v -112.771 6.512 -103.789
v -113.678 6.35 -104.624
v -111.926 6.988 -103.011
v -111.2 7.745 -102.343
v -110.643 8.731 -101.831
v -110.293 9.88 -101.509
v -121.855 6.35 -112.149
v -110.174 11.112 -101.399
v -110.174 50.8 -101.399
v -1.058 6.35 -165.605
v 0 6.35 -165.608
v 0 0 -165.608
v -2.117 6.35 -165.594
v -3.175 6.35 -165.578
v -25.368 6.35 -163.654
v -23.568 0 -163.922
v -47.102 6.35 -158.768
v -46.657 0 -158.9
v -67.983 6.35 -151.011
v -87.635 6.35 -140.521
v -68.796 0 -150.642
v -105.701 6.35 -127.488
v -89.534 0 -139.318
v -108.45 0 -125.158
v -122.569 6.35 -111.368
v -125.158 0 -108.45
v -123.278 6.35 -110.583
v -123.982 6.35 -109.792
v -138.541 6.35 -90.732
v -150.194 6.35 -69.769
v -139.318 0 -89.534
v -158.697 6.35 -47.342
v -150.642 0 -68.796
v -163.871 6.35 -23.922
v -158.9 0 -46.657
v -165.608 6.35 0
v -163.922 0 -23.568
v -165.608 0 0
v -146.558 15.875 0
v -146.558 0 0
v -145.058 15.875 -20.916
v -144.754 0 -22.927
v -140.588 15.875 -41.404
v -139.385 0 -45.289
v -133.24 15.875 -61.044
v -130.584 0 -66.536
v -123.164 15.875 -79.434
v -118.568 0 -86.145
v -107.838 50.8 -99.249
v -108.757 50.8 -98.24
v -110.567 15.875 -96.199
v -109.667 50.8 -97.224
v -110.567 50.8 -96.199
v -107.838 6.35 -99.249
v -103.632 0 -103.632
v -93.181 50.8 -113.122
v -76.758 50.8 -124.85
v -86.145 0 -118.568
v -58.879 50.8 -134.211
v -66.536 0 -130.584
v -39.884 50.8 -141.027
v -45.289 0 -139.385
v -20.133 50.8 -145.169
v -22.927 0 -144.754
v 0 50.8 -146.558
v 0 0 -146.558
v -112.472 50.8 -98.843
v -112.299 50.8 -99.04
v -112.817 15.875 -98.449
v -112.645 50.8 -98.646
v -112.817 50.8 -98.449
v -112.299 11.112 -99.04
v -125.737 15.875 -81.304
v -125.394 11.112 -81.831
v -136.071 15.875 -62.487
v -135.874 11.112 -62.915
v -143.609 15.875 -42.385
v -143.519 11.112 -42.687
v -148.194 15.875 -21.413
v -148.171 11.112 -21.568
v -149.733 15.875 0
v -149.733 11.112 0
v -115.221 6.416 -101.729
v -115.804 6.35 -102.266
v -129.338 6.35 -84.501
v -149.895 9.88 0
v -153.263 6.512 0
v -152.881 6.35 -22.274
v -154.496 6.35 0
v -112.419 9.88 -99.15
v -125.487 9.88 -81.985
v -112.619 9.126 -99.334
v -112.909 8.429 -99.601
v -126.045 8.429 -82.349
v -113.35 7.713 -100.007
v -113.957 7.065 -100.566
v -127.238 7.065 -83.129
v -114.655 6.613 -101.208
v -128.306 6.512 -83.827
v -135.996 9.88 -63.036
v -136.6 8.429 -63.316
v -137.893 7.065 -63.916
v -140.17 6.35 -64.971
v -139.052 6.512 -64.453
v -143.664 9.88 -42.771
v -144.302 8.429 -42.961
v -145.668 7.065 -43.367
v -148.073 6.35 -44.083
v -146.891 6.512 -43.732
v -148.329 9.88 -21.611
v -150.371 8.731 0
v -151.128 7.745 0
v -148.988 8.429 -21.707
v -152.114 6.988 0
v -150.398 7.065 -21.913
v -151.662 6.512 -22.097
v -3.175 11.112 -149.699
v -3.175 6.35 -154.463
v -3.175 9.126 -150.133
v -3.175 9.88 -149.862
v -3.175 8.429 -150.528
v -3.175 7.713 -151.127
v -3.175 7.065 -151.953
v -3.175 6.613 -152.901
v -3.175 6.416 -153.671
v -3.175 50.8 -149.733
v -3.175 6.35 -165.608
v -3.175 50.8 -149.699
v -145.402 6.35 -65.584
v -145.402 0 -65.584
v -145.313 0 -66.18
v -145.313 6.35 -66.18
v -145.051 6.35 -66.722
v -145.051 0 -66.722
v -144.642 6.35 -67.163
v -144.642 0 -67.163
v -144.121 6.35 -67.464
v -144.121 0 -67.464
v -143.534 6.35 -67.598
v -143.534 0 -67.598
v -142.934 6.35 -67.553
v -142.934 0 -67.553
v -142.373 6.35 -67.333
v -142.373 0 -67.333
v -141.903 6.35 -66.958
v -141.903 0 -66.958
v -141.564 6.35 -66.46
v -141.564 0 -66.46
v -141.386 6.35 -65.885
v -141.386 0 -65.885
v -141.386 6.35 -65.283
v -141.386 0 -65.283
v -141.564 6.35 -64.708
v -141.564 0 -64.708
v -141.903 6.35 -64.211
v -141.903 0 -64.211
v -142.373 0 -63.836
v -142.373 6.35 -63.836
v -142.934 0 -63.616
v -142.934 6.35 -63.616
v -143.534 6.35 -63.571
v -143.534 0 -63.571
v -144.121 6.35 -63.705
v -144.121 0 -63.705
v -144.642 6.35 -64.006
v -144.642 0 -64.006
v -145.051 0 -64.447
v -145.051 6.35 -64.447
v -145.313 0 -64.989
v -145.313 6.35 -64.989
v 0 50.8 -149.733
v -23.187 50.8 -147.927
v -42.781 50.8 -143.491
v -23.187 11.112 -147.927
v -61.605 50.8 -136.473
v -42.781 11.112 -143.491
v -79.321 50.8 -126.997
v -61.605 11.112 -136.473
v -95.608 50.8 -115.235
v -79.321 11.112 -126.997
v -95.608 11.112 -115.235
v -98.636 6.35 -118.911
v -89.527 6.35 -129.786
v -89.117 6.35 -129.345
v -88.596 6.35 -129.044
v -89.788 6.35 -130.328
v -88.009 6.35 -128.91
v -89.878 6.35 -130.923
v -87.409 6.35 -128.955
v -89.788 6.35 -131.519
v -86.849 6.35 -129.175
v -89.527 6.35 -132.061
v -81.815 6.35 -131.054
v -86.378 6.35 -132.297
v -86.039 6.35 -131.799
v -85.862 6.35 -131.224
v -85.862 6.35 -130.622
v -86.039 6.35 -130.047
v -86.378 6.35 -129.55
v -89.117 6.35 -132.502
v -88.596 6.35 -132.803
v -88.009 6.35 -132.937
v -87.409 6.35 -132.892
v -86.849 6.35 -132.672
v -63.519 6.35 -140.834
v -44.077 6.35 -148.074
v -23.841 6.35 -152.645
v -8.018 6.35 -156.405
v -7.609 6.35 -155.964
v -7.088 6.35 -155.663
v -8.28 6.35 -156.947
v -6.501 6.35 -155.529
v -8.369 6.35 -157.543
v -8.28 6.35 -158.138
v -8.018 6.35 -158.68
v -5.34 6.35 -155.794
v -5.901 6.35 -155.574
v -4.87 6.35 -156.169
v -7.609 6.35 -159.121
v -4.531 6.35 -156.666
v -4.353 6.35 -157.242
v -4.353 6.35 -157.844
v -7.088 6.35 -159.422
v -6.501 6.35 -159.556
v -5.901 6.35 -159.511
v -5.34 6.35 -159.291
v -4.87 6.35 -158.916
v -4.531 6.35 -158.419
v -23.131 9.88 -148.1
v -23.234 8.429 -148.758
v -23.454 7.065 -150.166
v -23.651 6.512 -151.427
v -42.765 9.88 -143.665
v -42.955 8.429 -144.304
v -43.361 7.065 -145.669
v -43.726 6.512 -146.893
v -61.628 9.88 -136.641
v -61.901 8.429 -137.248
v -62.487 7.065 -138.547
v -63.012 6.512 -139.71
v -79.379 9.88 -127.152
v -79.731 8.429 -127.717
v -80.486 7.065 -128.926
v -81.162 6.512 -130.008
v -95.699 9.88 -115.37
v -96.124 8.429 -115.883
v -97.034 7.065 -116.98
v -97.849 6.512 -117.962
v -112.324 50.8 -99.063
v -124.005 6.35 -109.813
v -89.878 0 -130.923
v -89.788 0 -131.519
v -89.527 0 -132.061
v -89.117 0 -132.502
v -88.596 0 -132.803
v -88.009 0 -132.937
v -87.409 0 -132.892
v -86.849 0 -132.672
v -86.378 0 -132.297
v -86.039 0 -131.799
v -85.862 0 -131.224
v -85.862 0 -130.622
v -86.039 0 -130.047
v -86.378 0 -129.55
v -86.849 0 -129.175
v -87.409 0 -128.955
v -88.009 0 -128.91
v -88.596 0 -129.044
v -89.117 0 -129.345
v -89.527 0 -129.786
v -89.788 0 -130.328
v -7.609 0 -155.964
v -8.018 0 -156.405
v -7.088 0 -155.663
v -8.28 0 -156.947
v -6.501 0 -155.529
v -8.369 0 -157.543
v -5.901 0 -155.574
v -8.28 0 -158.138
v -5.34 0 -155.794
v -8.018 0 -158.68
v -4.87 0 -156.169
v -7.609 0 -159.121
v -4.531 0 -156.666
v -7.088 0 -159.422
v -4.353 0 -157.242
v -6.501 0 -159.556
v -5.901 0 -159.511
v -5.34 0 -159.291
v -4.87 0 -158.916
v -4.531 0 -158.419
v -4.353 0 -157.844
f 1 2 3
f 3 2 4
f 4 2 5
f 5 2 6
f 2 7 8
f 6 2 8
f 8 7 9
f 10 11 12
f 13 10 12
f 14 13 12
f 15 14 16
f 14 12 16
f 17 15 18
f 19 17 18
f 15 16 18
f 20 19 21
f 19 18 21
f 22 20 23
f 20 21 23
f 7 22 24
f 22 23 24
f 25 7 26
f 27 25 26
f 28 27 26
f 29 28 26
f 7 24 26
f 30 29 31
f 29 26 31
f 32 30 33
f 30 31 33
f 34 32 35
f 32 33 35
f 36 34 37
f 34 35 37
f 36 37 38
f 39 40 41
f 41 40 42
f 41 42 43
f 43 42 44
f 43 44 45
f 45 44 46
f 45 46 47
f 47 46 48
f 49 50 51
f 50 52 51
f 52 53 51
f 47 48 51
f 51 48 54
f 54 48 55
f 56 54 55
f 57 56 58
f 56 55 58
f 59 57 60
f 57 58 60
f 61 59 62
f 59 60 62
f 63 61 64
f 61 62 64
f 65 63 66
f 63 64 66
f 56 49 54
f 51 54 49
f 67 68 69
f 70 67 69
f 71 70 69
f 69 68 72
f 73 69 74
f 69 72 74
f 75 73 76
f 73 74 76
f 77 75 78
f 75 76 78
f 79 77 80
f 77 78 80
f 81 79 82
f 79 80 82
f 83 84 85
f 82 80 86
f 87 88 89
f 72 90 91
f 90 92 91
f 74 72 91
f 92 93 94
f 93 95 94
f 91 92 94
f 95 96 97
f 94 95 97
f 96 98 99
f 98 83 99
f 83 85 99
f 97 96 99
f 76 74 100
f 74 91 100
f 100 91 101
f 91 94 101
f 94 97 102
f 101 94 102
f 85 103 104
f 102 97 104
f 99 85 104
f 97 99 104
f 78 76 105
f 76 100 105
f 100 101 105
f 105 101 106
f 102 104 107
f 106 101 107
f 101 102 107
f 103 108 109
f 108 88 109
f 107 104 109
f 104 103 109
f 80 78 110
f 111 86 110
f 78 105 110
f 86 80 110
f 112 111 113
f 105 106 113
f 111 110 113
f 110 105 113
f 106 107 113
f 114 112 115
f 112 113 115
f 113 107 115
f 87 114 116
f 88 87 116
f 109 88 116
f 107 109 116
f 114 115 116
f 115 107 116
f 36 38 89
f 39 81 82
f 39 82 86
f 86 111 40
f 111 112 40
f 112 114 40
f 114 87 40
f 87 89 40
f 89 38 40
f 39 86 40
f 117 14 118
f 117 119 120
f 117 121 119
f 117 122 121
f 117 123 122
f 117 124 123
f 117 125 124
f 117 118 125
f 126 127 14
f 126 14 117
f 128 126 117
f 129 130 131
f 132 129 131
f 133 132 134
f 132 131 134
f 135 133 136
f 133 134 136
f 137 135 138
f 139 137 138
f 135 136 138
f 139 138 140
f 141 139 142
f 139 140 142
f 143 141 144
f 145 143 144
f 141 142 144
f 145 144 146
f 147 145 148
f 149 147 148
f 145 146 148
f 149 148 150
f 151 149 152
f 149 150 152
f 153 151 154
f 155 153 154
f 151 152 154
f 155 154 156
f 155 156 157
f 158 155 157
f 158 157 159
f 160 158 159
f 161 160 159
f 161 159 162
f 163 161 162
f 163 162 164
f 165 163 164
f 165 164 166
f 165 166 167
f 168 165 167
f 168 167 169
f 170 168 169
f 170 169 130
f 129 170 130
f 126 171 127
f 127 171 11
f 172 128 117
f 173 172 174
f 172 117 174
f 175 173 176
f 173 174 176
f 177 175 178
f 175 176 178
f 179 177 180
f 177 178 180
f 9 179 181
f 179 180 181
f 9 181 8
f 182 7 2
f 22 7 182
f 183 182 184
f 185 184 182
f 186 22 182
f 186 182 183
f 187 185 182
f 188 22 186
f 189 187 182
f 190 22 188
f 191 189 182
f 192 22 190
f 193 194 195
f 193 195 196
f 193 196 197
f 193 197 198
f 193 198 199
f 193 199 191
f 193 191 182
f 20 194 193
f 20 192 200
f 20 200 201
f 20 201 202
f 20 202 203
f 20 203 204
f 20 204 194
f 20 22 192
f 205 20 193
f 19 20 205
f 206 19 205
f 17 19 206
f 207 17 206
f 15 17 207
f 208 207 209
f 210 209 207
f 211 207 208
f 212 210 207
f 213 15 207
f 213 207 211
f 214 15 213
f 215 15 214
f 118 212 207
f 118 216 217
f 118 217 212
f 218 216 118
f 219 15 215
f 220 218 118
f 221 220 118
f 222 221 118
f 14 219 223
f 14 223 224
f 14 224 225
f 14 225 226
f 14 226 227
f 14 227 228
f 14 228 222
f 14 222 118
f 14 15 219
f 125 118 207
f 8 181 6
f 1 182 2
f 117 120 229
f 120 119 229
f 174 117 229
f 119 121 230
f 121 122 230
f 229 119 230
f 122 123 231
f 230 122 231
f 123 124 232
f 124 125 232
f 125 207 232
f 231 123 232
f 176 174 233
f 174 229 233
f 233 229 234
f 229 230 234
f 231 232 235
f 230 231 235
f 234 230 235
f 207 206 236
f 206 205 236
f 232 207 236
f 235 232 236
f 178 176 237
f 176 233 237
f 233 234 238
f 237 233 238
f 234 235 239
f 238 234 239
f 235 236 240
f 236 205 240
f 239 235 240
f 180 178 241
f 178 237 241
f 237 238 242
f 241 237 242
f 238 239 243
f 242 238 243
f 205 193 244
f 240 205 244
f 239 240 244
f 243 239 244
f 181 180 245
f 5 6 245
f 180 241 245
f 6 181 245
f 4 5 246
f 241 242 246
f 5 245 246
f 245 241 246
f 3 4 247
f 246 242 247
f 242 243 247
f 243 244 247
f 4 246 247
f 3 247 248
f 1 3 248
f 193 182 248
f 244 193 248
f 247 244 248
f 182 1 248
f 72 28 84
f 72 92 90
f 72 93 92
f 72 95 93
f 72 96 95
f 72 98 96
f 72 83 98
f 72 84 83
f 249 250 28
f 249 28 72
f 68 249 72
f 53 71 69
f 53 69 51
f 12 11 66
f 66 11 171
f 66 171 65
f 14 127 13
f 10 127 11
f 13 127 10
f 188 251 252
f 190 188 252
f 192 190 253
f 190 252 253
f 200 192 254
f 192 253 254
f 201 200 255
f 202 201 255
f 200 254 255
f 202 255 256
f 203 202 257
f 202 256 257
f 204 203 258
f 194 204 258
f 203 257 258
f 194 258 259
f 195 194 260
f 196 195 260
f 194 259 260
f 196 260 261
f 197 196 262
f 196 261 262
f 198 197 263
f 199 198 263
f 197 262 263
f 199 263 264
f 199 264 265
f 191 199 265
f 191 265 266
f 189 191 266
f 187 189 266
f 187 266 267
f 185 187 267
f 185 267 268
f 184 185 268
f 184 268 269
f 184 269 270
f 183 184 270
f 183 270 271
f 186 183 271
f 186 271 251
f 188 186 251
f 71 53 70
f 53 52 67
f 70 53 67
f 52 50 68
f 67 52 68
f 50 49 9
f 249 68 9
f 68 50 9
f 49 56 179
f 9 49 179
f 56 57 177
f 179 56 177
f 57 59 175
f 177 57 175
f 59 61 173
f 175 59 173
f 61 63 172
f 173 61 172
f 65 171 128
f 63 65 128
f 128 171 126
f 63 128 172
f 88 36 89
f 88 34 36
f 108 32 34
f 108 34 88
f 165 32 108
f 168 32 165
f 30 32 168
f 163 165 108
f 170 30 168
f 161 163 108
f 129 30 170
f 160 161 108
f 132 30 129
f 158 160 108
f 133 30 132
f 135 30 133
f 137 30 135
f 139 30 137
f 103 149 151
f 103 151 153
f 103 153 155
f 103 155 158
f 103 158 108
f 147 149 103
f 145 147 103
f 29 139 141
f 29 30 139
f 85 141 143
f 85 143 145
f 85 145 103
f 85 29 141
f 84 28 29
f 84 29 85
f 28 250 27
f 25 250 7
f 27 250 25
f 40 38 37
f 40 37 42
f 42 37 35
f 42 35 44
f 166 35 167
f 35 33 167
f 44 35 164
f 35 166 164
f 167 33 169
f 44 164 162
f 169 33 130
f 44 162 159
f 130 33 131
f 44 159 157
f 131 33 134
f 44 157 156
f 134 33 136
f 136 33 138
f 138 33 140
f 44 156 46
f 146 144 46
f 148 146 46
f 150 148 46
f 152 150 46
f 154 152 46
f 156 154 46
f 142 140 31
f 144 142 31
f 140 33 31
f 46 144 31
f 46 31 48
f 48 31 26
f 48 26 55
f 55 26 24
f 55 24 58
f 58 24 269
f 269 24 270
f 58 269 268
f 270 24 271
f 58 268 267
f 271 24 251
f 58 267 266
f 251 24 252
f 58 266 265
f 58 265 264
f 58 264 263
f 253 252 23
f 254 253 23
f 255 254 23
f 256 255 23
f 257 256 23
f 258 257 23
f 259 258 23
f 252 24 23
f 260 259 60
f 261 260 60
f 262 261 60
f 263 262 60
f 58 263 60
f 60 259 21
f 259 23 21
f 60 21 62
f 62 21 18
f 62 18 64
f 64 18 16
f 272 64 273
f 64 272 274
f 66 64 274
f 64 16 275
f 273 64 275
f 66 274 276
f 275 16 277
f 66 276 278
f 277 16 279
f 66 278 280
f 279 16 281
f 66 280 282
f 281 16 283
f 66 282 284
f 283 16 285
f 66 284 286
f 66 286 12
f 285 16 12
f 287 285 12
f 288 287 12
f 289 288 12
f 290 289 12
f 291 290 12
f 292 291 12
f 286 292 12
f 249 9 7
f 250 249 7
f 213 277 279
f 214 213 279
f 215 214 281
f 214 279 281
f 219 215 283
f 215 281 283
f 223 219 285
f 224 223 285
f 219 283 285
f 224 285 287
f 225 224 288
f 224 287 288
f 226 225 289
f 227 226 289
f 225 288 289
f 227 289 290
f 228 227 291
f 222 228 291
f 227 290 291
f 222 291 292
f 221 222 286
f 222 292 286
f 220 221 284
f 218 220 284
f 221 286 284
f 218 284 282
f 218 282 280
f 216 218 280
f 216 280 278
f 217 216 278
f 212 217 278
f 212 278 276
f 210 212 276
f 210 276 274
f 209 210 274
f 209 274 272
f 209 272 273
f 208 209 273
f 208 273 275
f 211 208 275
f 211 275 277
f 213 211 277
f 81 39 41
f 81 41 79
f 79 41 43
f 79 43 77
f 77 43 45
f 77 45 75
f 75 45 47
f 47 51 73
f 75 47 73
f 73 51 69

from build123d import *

# Parameters (mm, degrees)
BOSS_EXTRUDE1_DEPTH        = 6.35
BOSS_EXTRUDE2_DEPTH        = 44.45
CUT_EXTRUDE2_DEPTH         = 1
CUT_EXTRUDE2_DEPTH_BACK    = 34.925
F_10_32_TAPPED_HOLE1_D     = 4.0386
F_10_32_TAPPED_HOLE1_DEPTH = 6.35
BOSS_EXTRUDE5_DEPTH        = 3.175
CIRPATTERN1_COUNT          = 2
CIRPATTERN1_ANGLE          = 47.375
FILLET1_R                  = 4.7625


with BuildPart() as part:
    # Sketch1 → Boss-Extrude1 (new body)
    with BuildSketch(Plane(origin=(0, 0, 0), x_dir=(1, 0, 0), z_dir=(0, 1, 0))):
        with BuildLine():
            Line((0, 146.558), (0, 165.608))
            ThreePointArc((0, 165.608), (-117.102539819, 117.102539819), (-165.608, 0))
            Line((-165.608, 0), (-146.558, 0))
            ThreePointArc((-146.558, 0), (-103.632155637, 103.632155637), (0, 146.558))
        make_face()
    extrude(amount=BOSS_EXTRUDE1_DEPTH)

    # Sketch4 → Boss-Extrude2 (add)
    with BuildSketch(Plane(origin=(0, 6.35, 0), x_dir=(1, 0, 0), z_dir=(0, 1, 0))):
        with BuildLine():
            Line((-149.733, 0), (-146.558, 0))
            ThreePointArc((-146.558, 0), (-103.632155637, 103.632155637), (0, 146.558))
            Line((0, 146.558), (0, 149.733))
            ThreePointArc((0, 149.733), (-105.877219667, 105.877219667), (-149.733, 0))
        make_face()
    extrude(amount=BOSS_EXTRUDE2_DEPTH)

    # Sketch5 → Cut-Extrude2 (cut, two sides)
    with BuildSketch(Plane(origin=(0, 50.8, 0), x_dir=(1, 0, 0), z_dir=(0, 1, 0))) as cut_extrude2_sk:
        with BuildLine():
            Line((-146.558, 0), (-149.733, 0))
            ThreePointArc((-149.733, 0), (-140.20067708, 52.57129859), (-112.817404434, 98.448994641))
            Line((-112.817404434, 98.448994641), (-110.567041393, 96.198631599))
            ThreePointArc((-110.567041393, 96.198631599), (-137.265676366, 51.355442319), (-146.558, 0))
        make_face()
    extrude(amount=CUT_EXTRUDE2_DEPTH, mode=Mode.SUBTRACT)
    extrude(cut_extrude2_sk.sketch, amount=-CUT_EXTRUDE2_DEPTH_BACK, mode=Mode.SUBTRACT)

    # #10-32 Tapped Hole1
    with Locations(Plane(origin=(0, 6.35, 0), x_dir=(1, 0, 0), z_dir=(0, 1, 0))):
        with Locations((-6.35, 157.542578595), (-87.858258413, 130.923309609), (-143.383000088, 65.58431105)):
            Hole(F_10_32_TAPPED_HOLE1_D / 2, depth=F_10_32_TAPPED_HOLE1_DEPTH)

    # Sketch9 → Boss-Extrude5 (add)
    with BuildSketch(Plane(origin=(0, 0, 0), x_dir=(0, 0, -1), z_dir=(1, 0, 0))):
        Polygon((149.733, 50.8), (165.608, 6.35), (146.558, 6.35), (146.558, 50.8), align=None)
    boss_extrude5 = extrude(amount=-BOSS_EXTRUDE5_DEPTH)

    # CirPattern1: Boss-Extrude5 ×2 about axis
    cirpattern1_axis = Axis((0, 0, 0), (0, 1, 0))
    for i in range(1, CIRPATTERN1_COUNT):
        add(boss_extrude5.rotate(cirpattern1_axis, i * CIRPATTERN1_ANGLE / (CIRPATTERN1_COUNT - 1)))

    # Fillet1
    fillet1_edges = [part.edges().sort_by_distance(p)[0] for p in [
        (-61.605387238, 6.35, -136.472515739),
        (-140.062228399, 6.35, -52.939054251),
    ]]
    fillet(fillet1_edges, radius=FILLET1_R)


solid = part.part
